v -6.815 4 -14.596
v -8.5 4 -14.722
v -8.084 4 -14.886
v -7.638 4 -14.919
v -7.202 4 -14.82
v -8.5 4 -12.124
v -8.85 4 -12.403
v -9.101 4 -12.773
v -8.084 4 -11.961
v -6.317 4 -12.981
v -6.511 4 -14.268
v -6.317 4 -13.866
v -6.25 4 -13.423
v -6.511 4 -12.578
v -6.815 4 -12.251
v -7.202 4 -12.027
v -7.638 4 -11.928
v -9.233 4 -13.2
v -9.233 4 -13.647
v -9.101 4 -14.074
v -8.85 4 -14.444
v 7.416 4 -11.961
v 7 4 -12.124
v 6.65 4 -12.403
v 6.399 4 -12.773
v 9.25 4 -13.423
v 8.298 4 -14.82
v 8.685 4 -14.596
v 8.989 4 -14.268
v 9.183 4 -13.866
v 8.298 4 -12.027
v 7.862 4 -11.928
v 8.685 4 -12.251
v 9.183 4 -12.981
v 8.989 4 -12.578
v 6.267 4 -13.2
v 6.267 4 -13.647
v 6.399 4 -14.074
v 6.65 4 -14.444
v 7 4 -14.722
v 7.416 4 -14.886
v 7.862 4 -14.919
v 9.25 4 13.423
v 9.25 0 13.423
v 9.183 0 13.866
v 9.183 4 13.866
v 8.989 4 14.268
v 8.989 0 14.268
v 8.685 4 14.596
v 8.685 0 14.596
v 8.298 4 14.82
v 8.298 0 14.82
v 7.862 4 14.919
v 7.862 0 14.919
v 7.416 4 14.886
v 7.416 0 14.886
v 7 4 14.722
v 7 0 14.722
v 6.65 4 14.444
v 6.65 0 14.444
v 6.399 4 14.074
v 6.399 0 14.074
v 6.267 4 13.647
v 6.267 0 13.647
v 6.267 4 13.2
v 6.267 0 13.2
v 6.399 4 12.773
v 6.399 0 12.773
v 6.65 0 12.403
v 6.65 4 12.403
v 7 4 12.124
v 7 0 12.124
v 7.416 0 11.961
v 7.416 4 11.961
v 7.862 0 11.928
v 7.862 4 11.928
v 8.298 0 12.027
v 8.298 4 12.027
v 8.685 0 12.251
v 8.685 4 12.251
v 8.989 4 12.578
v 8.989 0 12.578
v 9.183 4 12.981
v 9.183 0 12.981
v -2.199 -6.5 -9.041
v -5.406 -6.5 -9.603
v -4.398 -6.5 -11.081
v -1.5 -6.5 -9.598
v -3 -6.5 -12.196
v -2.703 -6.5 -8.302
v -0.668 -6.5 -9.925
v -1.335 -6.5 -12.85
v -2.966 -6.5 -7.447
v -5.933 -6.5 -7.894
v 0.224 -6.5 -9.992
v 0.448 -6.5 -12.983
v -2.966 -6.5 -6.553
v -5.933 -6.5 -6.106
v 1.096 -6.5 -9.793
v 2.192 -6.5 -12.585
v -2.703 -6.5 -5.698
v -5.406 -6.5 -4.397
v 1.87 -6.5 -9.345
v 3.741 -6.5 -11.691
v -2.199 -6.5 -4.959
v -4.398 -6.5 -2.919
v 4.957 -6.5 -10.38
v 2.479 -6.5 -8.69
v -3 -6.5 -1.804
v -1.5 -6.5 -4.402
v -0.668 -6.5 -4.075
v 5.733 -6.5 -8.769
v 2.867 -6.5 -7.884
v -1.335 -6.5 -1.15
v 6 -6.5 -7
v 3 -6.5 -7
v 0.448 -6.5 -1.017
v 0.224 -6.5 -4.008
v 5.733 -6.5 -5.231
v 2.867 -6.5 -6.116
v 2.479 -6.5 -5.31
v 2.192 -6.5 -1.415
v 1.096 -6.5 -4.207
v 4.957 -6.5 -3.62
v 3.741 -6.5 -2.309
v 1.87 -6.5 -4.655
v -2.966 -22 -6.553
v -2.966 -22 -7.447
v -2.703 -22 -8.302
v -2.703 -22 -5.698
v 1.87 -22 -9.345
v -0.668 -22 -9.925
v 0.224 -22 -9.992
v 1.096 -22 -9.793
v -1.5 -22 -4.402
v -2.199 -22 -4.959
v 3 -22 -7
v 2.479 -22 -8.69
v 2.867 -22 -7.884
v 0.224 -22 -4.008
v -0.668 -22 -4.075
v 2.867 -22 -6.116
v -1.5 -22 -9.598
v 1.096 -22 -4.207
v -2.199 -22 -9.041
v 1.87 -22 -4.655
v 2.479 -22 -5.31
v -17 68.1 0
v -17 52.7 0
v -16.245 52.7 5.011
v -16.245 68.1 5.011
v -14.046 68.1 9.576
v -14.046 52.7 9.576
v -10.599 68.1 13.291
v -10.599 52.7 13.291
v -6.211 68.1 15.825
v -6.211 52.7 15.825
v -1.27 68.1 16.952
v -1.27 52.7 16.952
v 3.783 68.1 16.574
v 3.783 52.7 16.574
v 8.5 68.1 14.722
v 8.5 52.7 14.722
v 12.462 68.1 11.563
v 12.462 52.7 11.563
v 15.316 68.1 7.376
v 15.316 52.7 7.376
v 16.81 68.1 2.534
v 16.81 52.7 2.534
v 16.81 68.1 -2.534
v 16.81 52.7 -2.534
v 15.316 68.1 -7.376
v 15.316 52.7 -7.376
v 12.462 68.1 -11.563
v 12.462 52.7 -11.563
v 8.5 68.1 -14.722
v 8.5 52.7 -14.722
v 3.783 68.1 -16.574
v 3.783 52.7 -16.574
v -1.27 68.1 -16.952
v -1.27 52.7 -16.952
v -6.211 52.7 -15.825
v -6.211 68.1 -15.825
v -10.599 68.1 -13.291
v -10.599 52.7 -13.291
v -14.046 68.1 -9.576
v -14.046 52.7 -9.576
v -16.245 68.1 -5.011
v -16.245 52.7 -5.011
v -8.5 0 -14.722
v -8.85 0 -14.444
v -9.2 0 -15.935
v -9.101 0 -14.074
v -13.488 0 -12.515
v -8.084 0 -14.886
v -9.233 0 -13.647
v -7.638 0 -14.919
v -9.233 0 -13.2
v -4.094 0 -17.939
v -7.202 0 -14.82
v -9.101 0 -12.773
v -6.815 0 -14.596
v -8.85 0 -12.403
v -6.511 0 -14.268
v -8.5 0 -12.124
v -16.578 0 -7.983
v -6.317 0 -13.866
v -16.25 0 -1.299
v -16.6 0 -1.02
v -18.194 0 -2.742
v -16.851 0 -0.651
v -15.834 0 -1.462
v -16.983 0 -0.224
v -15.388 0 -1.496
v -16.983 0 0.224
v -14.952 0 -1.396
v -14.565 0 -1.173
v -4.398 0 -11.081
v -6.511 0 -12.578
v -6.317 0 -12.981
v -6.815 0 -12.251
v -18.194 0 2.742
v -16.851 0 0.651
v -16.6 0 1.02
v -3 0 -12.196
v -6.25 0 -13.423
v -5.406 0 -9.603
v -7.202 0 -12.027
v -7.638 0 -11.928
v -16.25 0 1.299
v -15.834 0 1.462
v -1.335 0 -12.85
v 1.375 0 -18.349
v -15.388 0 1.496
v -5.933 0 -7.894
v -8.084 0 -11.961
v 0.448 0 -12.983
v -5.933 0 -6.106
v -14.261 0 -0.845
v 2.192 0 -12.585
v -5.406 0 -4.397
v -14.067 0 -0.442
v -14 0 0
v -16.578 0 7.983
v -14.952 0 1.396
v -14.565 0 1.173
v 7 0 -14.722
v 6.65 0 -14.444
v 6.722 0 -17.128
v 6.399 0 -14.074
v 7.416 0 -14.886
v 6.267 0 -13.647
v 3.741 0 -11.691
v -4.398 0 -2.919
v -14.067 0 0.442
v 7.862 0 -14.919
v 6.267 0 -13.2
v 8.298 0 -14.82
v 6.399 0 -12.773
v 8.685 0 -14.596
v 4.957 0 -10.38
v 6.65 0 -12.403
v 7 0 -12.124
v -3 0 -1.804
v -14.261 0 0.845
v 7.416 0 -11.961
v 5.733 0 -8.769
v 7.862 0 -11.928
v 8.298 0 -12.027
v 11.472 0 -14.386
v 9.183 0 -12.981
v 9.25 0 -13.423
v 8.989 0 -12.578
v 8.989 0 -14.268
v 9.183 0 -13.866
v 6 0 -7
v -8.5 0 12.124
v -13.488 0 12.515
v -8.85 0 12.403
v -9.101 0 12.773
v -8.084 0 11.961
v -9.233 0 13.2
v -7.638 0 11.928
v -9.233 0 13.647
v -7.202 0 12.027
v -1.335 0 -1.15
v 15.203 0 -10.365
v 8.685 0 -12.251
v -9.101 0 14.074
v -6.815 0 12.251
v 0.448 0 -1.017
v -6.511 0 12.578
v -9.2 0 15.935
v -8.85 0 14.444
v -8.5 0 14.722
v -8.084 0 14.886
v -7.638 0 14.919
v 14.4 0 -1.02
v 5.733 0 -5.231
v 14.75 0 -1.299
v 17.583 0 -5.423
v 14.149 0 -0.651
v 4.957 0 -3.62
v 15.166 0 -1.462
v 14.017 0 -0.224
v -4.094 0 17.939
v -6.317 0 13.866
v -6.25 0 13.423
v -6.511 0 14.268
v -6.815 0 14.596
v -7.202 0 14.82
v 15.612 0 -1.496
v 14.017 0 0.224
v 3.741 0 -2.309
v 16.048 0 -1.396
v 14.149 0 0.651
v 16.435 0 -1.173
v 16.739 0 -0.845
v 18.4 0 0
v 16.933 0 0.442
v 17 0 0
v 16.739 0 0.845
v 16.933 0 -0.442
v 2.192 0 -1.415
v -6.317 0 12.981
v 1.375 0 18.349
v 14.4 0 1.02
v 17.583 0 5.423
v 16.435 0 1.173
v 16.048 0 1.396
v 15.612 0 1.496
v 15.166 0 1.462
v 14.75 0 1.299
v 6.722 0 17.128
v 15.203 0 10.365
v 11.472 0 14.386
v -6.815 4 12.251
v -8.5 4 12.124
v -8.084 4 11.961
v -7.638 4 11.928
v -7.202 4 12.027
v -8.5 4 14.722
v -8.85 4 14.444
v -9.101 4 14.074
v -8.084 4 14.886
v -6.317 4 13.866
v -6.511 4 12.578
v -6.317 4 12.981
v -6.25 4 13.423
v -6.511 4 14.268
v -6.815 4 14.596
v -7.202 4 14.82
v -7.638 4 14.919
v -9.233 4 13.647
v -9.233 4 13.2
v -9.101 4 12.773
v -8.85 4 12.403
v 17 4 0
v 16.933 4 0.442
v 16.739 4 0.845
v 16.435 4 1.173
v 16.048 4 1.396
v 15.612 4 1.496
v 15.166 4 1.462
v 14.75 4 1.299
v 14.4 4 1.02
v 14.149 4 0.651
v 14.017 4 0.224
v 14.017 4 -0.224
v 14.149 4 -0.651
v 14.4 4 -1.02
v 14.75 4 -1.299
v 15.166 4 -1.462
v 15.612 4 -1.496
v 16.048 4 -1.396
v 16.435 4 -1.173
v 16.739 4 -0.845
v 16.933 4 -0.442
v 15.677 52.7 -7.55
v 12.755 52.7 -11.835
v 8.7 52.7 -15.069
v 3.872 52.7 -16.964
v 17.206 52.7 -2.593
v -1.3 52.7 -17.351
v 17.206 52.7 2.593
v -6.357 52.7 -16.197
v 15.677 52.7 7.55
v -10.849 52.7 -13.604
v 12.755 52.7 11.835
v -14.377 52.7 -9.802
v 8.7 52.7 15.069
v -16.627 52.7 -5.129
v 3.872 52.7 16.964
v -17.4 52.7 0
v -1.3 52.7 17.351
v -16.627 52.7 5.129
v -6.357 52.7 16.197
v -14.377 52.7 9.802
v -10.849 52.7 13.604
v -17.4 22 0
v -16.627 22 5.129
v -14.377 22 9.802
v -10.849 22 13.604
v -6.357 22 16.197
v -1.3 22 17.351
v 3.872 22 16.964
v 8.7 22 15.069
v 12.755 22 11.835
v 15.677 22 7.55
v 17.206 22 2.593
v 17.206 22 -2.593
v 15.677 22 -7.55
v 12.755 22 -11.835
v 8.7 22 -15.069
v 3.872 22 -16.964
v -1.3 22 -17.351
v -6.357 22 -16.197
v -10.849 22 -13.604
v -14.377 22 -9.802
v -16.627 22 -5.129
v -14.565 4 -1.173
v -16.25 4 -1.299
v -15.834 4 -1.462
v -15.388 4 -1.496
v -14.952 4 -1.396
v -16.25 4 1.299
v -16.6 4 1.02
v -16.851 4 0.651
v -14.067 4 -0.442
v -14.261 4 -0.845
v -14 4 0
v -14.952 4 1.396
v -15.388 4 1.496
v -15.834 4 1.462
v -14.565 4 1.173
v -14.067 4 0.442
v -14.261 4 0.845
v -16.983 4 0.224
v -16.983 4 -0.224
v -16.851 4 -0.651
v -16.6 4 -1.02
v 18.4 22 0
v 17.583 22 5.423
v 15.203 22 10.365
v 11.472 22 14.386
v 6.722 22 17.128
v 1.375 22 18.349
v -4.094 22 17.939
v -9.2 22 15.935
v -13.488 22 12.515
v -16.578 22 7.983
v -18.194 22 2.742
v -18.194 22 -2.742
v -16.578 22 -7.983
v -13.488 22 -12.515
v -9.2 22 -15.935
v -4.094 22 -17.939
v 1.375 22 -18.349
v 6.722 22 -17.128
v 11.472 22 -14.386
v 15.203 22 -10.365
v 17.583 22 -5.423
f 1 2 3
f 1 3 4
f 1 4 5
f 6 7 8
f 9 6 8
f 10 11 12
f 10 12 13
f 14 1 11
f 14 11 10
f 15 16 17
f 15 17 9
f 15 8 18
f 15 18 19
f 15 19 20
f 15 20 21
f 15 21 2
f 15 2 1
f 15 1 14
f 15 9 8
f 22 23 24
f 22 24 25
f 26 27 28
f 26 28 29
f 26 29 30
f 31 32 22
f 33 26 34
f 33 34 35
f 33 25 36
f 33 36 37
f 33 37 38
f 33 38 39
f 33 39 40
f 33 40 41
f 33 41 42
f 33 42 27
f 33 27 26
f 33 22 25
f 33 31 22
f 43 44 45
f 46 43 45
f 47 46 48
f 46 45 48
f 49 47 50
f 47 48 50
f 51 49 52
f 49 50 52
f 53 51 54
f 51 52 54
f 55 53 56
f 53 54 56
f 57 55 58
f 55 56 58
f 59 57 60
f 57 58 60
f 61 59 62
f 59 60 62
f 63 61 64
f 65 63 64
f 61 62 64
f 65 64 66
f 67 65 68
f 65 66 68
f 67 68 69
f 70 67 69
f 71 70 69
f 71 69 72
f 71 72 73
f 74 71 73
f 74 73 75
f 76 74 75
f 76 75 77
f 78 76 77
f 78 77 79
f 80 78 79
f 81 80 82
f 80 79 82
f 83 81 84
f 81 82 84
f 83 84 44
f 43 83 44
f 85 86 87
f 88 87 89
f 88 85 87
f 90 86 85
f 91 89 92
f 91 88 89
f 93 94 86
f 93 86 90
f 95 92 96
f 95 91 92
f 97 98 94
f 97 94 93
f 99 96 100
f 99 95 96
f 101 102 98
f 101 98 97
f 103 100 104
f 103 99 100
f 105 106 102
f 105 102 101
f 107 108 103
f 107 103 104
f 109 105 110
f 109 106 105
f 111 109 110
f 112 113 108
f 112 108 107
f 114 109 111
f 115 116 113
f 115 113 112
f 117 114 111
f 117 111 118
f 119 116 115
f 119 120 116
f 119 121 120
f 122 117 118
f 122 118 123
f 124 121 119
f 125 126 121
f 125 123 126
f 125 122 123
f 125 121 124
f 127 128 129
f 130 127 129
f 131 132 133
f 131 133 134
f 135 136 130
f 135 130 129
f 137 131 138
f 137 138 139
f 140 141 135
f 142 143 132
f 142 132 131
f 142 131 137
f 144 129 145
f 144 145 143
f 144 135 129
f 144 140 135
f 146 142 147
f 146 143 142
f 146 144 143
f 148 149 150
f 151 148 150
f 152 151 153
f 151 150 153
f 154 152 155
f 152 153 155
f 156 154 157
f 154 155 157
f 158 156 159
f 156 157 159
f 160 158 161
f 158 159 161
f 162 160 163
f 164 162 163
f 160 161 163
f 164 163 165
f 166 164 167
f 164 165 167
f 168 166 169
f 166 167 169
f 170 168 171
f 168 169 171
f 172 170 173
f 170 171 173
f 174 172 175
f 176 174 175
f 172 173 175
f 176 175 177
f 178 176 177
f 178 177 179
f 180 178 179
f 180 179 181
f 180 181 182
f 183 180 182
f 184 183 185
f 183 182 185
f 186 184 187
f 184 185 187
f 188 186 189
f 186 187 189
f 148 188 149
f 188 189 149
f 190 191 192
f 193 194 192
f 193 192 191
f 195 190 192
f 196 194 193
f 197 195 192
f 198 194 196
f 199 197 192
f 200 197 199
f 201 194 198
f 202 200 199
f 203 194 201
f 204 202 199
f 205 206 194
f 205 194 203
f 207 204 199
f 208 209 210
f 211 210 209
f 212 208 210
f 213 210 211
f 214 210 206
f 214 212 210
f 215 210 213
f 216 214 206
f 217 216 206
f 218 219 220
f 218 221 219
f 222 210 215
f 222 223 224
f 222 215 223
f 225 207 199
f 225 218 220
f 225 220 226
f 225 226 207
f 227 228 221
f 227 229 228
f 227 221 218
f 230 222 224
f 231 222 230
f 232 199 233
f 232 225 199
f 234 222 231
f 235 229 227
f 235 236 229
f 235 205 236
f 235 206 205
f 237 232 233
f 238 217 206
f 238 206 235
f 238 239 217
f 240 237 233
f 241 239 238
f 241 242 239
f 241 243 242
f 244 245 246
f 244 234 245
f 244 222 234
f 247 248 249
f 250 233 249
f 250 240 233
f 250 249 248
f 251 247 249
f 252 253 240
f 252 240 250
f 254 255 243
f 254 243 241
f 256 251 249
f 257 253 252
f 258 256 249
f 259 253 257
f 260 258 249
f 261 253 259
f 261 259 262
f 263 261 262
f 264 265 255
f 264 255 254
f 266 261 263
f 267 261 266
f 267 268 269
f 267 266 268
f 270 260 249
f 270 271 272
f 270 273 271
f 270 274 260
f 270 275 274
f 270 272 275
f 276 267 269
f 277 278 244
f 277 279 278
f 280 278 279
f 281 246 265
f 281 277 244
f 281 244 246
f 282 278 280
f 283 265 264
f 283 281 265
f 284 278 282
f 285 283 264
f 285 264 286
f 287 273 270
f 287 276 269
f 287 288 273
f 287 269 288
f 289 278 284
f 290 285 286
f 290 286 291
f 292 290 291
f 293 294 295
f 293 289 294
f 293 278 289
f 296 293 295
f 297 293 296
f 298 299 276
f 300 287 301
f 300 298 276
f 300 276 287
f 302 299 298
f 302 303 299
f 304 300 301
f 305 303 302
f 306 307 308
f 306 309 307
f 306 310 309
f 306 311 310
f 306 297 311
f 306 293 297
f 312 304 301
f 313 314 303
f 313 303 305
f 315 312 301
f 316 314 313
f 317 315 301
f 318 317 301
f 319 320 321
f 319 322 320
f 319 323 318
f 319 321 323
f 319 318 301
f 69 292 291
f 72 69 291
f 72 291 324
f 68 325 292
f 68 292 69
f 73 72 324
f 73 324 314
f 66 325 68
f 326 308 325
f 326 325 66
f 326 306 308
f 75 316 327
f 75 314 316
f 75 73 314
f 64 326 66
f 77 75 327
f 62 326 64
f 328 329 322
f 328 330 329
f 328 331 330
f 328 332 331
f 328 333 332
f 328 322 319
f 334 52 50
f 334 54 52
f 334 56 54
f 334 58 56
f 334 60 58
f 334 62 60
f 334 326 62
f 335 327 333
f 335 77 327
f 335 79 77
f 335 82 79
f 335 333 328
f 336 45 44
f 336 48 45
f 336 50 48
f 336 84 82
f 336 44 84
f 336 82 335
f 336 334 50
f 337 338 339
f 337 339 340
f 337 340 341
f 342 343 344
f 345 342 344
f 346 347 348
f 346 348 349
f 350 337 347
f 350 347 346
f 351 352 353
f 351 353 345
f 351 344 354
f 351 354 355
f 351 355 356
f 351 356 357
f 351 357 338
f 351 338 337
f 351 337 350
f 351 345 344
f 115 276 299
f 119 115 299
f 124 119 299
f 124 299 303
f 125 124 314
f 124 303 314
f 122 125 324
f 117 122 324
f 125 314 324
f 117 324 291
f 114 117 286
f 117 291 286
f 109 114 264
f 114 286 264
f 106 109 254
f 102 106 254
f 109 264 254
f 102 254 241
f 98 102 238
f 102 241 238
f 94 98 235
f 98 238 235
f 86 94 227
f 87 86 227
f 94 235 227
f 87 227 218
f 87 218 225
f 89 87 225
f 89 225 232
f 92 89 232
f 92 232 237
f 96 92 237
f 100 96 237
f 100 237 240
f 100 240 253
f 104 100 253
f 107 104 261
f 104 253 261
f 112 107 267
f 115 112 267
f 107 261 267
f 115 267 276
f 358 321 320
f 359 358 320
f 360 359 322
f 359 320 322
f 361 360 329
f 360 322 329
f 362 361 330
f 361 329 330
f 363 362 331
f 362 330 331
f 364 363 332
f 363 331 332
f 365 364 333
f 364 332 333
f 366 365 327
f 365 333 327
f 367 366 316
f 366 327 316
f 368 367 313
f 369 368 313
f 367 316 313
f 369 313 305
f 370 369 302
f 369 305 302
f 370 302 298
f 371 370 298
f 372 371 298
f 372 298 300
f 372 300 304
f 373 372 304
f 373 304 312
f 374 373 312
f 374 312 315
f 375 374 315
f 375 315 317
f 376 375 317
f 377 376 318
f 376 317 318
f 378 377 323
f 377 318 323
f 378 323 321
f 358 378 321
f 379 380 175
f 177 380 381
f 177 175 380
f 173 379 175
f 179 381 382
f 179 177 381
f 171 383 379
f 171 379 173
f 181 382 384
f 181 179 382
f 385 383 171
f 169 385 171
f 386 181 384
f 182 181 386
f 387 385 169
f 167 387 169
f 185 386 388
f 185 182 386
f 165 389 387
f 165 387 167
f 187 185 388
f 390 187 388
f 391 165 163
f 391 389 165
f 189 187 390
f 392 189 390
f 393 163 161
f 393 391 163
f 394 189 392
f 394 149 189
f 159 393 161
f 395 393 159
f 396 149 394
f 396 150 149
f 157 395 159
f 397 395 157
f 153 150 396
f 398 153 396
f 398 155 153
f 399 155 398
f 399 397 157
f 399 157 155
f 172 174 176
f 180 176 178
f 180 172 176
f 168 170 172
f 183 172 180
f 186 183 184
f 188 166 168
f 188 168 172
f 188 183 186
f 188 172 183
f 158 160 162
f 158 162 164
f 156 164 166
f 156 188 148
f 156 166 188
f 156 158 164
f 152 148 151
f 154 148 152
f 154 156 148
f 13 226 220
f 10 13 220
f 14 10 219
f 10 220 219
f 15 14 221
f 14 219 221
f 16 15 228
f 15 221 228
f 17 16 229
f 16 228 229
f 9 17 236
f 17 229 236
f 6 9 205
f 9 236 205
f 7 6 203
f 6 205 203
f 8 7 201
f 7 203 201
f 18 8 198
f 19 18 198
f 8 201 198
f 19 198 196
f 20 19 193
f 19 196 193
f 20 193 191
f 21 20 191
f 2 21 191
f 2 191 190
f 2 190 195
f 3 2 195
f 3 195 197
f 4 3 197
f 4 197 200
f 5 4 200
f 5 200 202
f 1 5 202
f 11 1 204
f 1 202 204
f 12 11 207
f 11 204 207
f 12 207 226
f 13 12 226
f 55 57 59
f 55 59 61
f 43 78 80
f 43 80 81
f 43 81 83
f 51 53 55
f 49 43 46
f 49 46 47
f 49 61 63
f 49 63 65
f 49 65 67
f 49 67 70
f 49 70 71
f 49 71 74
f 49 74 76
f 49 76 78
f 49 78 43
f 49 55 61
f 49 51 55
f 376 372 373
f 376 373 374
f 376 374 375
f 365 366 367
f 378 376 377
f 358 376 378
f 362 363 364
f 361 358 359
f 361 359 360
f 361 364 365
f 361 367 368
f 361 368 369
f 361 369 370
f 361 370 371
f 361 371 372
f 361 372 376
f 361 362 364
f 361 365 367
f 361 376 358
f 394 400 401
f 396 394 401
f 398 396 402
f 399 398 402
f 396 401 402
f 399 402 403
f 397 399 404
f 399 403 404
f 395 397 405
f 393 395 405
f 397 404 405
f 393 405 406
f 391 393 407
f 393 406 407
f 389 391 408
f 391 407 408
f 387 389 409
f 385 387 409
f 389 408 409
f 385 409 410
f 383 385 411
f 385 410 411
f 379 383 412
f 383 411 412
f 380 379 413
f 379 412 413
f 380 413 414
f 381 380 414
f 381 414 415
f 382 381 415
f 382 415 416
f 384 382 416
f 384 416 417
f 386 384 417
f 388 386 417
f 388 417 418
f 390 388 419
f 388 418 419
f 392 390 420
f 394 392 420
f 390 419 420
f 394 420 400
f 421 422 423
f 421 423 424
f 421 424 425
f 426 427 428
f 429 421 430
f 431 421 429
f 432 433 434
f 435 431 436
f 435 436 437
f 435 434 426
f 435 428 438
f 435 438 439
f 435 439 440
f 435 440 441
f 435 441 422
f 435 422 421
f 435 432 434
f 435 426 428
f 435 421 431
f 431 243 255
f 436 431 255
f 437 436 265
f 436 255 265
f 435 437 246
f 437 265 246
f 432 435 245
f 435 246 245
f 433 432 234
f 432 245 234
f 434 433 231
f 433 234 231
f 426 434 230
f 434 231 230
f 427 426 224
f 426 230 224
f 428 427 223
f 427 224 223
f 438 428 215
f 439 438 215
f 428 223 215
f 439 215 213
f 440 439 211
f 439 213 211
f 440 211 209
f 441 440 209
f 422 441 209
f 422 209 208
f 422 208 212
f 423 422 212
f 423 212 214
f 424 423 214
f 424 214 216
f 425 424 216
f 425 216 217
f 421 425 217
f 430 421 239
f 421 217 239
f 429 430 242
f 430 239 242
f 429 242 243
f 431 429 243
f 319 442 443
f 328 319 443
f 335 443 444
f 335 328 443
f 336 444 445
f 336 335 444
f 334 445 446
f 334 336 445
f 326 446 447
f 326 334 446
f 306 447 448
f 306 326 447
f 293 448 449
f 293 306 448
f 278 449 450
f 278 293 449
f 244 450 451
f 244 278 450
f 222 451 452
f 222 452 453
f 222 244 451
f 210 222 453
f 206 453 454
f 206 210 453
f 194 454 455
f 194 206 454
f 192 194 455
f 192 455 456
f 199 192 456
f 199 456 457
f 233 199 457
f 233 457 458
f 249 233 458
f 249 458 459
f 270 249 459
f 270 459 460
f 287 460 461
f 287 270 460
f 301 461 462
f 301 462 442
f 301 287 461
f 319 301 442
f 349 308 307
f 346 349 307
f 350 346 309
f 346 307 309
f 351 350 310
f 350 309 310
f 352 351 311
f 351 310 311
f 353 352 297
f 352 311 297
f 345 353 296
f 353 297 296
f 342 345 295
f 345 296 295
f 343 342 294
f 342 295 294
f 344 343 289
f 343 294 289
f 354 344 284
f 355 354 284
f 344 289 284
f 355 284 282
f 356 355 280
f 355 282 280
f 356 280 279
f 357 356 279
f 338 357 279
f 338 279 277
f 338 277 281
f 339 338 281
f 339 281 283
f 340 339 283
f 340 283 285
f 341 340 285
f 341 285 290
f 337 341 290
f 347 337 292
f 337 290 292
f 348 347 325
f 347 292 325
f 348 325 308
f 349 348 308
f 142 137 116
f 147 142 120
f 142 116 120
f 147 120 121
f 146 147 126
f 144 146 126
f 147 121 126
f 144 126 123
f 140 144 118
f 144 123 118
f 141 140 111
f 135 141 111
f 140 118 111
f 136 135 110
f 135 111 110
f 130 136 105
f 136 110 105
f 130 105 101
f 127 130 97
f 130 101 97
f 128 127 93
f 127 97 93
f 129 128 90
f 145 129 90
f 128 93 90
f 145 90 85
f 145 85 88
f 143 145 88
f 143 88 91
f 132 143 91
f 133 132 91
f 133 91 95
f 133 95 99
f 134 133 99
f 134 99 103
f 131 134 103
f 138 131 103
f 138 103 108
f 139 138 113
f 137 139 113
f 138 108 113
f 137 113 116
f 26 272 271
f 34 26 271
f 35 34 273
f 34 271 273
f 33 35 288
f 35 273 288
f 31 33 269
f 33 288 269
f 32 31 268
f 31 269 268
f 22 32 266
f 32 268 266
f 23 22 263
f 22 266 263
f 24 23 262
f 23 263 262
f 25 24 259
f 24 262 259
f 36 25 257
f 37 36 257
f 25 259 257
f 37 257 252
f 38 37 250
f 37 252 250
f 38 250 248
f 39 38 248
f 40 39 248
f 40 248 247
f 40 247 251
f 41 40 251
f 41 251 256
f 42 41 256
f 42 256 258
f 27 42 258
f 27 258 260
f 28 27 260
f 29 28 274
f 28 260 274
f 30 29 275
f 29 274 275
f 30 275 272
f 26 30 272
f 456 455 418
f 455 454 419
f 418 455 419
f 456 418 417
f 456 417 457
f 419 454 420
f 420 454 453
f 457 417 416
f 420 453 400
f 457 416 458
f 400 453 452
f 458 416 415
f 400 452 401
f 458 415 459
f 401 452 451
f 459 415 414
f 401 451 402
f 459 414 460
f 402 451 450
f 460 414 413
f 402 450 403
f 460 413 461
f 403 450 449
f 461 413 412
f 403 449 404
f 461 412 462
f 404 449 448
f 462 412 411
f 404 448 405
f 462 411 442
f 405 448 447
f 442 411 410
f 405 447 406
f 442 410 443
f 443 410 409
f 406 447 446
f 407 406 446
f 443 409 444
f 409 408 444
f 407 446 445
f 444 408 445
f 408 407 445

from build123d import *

# Parameters (mm, degrees)
F0_R      = 18.4
F1_DEPTH  = 22
F2_R      = 17.4
F3_DEPTH  = 30.7
F4_R      = 17
F5_DEPTH  = 15.4
F6_R      = 6
F7_DEPTH  = 6.5
F8_R      = 3
F9_DEPTH  = 15.5
F10_R     = 1.5
F11_DEPTH = 4


with BuildPart() as f1:
    # F0 (on Front) → F1 (new body)
    with BuildSketch(Plane.XZ):
        Circle(F0_R)
    extrude(amount=-F1_DEPTH)

    # F2 (on face) → F3 (join)
    with BuildSketch(Plane(origin=(0, 22, 0), x_dir=(-1, 0, 0), z_dir=(0, 1, 0))):
        Circle(F2_R)
    extrude(amount=F3_DEPTH)

    # F4 (on face) → F5 (join)
    with BuildSketch(Plane(origin=(0, 52.7, 0), x_dir=(-1, 0, 0), z_dir=(0, 1, 0))):
        Circle(F4_R)
    extrude(amount=F5_DEPTH)

    # F6 (on face) → F7 (join)
    with BuildSketch(Plane.XZ):
        with Locations((0, -7)):
            Circle(F6_R)
    extrude(amount=F7_DEPTH)

    # F8 (on face) → F9 (join)
    with BuildSketch(Plane.XZ.offset(6.5)):
        with Locations((0, -7)):
            Circle(F8_R)
    extrude(amount=F9_DEPTH)

    # F10 (on face) → F11 (cut)
    with BuildSketch(Plane.XZ):
        with Locations((-15.5, 0)):
            Circle(F10_R)
        with Locations((-7.75, 13.423394)):
            Circle(F10_R)
        with Locations((7.75, 13.423394)):
            Circle(F10_R)
        with Locations((15.5, 0)):
            Circle(F10_R)
        with Locations((-7.75, -13.423394)):
            Circle(F10_R)
        with Locations((7.75, -13.423394)):
            Circle(F10_R)
    extrude(amount=-F11_DEPTH, mode=Mode.SUBTRACT)


solid = f1.part
